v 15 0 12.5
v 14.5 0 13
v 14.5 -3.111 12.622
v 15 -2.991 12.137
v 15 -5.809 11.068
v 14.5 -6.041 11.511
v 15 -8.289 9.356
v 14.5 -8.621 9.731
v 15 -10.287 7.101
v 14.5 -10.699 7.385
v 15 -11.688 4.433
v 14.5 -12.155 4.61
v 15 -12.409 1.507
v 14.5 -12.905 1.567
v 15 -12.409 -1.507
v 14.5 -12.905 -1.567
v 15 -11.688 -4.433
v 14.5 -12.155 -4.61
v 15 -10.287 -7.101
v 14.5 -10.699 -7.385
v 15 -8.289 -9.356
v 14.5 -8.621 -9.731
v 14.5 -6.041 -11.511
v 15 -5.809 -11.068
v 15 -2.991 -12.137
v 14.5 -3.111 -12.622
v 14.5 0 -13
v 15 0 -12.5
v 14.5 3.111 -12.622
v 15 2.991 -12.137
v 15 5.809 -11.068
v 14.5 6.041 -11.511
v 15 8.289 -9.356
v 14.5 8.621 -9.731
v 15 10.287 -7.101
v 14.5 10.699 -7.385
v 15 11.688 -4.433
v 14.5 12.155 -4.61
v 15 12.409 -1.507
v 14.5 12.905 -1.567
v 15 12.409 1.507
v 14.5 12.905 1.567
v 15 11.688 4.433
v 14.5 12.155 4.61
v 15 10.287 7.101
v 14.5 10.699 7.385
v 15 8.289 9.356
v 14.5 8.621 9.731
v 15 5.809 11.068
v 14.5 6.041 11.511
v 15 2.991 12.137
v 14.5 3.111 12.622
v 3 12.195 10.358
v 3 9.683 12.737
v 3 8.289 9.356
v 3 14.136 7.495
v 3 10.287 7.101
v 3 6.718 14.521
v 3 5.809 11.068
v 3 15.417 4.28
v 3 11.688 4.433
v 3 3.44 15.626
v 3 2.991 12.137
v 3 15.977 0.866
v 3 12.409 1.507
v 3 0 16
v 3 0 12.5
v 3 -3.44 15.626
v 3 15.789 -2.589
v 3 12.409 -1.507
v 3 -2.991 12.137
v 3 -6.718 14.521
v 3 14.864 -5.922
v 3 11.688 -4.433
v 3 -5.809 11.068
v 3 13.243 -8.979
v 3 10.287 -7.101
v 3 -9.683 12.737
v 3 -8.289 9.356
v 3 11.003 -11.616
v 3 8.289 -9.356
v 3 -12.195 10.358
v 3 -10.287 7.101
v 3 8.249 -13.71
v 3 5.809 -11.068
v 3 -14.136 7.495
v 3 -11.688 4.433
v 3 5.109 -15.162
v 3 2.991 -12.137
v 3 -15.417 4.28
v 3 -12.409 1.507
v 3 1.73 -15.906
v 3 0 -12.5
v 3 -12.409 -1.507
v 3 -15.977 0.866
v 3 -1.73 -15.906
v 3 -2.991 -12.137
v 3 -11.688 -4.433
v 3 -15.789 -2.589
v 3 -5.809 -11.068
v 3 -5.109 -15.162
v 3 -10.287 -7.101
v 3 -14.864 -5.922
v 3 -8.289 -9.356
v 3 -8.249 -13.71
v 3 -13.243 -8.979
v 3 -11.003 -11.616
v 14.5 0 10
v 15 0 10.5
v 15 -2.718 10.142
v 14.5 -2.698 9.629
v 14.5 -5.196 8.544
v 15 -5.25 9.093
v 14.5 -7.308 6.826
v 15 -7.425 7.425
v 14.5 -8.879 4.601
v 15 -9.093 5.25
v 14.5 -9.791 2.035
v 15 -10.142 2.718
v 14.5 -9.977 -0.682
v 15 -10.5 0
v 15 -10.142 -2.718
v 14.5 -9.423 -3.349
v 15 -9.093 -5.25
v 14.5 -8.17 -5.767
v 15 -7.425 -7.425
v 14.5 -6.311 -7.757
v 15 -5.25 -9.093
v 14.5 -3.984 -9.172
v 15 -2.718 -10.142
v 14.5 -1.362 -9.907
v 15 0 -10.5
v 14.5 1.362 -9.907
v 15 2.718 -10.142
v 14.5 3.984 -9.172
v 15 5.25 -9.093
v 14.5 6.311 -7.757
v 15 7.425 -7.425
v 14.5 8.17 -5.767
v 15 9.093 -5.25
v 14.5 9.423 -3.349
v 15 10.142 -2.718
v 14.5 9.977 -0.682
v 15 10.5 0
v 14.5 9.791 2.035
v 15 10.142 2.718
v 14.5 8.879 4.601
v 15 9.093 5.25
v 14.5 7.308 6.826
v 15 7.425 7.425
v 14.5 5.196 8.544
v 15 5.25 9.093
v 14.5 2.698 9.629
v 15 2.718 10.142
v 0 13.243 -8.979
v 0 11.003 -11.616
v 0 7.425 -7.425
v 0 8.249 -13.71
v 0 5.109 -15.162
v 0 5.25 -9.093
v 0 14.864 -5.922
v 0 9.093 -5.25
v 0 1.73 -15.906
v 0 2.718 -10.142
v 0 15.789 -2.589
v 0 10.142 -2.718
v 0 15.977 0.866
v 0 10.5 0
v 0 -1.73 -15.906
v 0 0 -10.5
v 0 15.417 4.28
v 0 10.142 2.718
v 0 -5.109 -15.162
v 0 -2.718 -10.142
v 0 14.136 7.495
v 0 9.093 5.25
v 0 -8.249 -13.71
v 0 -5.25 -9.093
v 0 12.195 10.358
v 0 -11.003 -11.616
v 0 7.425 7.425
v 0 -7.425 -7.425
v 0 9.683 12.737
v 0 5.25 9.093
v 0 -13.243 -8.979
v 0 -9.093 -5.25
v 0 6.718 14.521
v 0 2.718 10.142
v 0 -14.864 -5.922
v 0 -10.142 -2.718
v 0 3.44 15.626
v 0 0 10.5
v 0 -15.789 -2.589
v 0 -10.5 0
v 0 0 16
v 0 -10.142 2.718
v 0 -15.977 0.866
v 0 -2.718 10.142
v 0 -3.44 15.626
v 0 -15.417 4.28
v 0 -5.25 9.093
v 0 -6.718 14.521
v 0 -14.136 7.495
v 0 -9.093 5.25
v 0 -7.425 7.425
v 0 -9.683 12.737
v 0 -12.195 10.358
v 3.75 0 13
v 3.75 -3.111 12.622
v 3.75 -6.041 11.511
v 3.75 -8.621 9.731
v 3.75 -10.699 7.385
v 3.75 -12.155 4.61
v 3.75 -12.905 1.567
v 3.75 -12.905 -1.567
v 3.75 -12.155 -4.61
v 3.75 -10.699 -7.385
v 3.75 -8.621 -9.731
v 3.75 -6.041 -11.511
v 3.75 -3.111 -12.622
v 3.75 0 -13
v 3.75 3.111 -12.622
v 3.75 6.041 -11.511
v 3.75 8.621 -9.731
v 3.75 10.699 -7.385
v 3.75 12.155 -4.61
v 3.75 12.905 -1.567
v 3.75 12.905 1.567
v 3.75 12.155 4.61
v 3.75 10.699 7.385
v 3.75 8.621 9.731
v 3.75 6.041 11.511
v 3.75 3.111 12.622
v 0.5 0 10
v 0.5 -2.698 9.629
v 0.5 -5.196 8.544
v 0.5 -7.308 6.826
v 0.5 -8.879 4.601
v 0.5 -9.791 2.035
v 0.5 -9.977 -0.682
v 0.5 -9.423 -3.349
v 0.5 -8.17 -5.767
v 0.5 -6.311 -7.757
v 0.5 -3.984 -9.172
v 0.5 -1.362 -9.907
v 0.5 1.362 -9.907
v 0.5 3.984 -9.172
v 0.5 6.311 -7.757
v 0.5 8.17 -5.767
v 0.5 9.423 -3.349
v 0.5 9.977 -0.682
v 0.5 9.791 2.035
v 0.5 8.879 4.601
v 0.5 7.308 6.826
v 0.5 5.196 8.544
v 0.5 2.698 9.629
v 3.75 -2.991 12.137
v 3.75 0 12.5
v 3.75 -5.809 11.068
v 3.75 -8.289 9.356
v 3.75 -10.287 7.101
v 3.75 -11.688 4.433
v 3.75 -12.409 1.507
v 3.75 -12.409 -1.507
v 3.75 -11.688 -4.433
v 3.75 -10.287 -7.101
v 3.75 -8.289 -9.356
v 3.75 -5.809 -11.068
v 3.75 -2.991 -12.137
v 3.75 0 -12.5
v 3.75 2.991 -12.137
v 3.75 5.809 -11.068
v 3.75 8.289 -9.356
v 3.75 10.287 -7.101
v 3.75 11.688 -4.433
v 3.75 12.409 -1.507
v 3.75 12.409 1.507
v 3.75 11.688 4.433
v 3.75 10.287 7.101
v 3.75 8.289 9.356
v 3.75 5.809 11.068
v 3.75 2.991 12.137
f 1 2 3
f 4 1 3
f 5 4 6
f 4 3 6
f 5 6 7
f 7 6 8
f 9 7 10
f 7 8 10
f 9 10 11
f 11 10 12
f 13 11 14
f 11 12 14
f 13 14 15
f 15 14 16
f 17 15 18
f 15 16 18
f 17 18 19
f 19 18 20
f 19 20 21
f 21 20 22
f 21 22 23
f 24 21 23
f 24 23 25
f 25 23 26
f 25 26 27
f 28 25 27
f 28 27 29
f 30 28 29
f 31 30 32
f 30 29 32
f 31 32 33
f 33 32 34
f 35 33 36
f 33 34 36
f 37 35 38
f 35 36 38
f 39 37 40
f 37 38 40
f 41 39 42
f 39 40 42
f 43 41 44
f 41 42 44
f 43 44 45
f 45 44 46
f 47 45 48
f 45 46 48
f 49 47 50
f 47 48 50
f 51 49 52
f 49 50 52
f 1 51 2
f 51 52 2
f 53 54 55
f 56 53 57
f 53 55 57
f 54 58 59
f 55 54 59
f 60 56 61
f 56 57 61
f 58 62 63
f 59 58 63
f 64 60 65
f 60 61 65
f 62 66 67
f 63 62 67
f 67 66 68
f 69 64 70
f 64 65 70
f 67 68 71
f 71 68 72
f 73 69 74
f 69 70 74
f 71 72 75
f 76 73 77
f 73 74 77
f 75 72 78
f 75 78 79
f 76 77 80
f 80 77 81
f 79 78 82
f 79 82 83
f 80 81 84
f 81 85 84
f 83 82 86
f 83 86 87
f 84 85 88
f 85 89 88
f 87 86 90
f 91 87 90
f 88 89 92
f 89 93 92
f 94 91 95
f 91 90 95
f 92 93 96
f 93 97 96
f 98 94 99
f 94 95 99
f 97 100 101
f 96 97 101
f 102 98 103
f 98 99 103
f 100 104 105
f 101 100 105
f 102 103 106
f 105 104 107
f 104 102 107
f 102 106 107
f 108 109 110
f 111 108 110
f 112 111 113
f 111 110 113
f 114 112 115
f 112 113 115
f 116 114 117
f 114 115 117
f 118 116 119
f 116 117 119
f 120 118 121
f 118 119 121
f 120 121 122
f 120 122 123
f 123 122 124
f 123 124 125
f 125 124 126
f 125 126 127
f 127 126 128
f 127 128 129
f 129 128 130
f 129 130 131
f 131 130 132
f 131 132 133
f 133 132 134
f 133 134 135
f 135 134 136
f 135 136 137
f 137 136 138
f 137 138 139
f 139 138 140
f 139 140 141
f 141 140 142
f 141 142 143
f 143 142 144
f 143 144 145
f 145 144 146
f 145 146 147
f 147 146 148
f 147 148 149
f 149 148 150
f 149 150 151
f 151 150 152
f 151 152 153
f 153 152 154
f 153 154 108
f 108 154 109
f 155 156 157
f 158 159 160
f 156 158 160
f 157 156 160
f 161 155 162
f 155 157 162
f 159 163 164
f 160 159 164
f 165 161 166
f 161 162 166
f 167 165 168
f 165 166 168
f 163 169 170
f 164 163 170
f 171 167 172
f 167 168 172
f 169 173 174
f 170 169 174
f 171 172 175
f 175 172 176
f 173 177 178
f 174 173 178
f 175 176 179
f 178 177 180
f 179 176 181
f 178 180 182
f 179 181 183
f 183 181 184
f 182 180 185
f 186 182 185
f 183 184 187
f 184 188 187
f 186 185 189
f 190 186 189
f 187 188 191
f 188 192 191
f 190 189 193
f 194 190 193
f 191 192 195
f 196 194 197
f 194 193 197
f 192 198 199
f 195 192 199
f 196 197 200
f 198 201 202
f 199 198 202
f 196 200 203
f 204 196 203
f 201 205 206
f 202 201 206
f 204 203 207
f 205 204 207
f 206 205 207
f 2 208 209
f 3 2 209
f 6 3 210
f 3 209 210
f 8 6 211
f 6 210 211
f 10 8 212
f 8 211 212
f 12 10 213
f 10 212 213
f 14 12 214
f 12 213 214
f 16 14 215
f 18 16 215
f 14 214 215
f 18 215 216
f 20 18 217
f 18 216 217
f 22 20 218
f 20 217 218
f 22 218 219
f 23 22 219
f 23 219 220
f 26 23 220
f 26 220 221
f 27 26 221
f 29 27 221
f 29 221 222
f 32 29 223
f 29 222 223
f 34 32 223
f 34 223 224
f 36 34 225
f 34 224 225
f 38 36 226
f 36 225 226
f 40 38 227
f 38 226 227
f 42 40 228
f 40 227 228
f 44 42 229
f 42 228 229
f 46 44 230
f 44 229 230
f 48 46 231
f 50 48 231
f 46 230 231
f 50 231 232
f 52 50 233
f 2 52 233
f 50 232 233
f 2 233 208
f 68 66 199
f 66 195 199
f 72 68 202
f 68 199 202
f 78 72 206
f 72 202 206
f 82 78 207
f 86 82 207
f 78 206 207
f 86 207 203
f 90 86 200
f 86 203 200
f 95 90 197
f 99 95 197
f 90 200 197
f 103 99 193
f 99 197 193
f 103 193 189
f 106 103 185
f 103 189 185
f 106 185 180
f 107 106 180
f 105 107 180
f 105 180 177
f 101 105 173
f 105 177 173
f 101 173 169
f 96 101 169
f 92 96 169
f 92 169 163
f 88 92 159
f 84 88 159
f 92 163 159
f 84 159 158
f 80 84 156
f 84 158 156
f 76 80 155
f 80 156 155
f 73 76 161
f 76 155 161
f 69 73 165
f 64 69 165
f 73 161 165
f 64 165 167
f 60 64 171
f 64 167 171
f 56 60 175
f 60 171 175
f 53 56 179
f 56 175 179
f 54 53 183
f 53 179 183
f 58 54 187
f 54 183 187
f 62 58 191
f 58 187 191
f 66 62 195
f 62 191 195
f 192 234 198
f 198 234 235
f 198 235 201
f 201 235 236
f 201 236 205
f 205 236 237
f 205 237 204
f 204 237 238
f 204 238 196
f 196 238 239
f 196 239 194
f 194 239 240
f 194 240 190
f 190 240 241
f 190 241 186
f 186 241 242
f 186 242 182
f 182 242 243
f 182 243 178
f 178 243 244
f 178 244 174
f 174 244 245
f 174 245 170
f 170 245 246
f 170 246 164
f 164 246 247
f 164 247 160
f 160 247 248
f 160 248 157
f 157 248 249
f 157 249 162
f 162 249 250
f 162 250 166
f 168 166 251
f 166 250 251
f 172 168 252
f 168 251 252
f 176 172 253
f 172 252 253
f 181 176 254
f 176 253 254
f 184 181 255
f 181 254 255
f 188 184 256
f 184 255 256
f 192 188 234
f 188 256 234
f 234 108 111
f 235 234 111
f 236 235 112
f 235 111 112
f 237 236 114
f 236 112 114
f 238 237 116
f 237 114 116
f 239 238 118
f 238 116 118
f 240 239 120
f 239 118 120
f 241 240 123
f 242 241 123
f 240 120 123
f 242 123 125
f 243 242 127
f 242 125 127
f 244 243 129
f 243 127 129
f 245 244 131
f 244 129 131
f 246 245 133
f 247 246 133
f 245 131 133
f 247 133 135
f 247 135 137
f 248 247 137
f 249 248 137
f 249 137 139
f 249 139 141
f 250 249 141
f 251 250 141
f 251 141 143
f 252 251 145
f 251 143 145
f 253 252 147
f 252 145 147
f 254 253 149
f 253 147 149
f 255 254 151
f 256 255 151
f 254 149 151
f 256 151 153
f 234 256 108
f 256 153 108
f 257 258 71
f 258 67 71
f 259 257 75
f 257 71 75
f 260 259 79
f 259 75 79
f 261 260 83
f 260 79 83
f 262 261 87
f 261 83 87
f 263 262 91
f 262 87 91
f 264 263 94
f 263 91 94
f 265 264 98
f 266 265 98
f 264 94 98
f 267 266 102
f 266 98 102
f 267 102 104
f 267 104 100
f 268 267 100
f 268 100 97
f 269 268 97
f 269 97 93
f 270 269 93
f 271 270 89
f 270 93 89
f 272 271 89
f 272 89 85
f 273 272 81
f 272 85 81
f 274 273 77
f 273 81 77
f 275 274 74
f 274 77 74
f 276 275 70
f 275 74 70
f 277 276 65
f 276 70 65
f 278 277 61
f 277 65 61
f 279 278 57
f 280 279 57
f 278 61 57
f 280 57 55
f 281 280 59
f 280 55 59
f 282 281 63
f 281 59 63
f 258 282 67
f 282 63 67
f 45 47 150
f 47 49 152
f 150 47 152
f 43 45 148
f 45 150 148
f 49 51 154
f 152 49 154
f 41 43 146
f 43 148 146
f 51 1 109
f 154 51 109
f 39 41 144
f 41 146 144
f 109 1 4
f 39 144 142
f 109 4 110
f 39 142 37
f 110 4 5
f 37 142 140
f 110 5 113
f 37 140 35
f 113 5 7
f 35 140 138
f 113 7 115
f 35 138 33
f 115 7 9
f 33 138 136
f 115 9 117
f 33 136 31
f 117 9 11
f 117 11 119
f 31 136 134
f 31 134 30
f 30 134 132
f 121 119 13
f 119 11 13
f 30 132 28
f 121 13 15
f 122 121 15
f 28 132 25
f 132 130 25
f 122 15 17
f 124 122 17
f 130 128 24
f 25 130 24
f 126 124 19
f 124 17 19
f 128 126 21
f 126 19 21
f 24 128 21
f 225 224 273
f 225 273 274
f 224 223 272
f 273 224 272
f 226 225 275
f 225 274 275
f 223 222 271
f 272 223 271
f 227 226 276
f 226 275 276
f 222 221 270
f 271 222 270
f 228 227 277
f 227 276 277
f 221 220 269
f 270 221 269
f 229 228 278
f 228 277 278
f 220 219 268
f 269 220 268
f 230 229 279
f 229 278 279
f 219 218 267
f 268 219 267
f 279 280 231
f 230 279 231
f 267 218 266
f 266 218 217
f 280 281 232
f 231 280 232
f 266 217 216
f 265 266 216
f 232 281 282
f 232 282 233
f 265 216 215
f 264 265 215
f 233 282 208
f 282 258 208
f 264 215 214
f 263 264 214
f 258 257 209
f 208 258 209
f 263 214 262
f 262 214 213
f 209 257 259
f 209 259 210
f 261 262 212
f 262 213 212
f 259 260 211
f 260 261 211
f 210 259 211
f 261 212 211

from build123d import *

# Parameters (mm, degrees)
ZKOSIT1_SIZE = 0.5


with BuildPart() as part:
    # Skica1 → Otočit kolem osy1 (revolve)
    with BuildSketch(Plane.XY, mode=Mode.PRIVATE) as oto_it_kolem_osy1_sk:
        Polygon((0, 16), (0, 10), (15, 10), (15, 13), (3.75, 13), (3.75, 12.5), (3, 12.5), (3, 16), align=None)
    revolve(oto_it_kolem_osy1_sk.sketch.rotate(Axis((0, 0, 0), (1, 0, 0)), 90), axis=Axis((0, 0, 0), (1, 0, 0)))

    # Zkosit1
    zkosit1_edges = [part.edges().sort_by_distance(p)[0] for p in [
        (0, 0, -10),
        (15, 0, -10),
        (15, 0, -13),
    ]]
    chamfer(zkosit1_edges, length=ZKOSIT1_SIZE)


solid = part.part
